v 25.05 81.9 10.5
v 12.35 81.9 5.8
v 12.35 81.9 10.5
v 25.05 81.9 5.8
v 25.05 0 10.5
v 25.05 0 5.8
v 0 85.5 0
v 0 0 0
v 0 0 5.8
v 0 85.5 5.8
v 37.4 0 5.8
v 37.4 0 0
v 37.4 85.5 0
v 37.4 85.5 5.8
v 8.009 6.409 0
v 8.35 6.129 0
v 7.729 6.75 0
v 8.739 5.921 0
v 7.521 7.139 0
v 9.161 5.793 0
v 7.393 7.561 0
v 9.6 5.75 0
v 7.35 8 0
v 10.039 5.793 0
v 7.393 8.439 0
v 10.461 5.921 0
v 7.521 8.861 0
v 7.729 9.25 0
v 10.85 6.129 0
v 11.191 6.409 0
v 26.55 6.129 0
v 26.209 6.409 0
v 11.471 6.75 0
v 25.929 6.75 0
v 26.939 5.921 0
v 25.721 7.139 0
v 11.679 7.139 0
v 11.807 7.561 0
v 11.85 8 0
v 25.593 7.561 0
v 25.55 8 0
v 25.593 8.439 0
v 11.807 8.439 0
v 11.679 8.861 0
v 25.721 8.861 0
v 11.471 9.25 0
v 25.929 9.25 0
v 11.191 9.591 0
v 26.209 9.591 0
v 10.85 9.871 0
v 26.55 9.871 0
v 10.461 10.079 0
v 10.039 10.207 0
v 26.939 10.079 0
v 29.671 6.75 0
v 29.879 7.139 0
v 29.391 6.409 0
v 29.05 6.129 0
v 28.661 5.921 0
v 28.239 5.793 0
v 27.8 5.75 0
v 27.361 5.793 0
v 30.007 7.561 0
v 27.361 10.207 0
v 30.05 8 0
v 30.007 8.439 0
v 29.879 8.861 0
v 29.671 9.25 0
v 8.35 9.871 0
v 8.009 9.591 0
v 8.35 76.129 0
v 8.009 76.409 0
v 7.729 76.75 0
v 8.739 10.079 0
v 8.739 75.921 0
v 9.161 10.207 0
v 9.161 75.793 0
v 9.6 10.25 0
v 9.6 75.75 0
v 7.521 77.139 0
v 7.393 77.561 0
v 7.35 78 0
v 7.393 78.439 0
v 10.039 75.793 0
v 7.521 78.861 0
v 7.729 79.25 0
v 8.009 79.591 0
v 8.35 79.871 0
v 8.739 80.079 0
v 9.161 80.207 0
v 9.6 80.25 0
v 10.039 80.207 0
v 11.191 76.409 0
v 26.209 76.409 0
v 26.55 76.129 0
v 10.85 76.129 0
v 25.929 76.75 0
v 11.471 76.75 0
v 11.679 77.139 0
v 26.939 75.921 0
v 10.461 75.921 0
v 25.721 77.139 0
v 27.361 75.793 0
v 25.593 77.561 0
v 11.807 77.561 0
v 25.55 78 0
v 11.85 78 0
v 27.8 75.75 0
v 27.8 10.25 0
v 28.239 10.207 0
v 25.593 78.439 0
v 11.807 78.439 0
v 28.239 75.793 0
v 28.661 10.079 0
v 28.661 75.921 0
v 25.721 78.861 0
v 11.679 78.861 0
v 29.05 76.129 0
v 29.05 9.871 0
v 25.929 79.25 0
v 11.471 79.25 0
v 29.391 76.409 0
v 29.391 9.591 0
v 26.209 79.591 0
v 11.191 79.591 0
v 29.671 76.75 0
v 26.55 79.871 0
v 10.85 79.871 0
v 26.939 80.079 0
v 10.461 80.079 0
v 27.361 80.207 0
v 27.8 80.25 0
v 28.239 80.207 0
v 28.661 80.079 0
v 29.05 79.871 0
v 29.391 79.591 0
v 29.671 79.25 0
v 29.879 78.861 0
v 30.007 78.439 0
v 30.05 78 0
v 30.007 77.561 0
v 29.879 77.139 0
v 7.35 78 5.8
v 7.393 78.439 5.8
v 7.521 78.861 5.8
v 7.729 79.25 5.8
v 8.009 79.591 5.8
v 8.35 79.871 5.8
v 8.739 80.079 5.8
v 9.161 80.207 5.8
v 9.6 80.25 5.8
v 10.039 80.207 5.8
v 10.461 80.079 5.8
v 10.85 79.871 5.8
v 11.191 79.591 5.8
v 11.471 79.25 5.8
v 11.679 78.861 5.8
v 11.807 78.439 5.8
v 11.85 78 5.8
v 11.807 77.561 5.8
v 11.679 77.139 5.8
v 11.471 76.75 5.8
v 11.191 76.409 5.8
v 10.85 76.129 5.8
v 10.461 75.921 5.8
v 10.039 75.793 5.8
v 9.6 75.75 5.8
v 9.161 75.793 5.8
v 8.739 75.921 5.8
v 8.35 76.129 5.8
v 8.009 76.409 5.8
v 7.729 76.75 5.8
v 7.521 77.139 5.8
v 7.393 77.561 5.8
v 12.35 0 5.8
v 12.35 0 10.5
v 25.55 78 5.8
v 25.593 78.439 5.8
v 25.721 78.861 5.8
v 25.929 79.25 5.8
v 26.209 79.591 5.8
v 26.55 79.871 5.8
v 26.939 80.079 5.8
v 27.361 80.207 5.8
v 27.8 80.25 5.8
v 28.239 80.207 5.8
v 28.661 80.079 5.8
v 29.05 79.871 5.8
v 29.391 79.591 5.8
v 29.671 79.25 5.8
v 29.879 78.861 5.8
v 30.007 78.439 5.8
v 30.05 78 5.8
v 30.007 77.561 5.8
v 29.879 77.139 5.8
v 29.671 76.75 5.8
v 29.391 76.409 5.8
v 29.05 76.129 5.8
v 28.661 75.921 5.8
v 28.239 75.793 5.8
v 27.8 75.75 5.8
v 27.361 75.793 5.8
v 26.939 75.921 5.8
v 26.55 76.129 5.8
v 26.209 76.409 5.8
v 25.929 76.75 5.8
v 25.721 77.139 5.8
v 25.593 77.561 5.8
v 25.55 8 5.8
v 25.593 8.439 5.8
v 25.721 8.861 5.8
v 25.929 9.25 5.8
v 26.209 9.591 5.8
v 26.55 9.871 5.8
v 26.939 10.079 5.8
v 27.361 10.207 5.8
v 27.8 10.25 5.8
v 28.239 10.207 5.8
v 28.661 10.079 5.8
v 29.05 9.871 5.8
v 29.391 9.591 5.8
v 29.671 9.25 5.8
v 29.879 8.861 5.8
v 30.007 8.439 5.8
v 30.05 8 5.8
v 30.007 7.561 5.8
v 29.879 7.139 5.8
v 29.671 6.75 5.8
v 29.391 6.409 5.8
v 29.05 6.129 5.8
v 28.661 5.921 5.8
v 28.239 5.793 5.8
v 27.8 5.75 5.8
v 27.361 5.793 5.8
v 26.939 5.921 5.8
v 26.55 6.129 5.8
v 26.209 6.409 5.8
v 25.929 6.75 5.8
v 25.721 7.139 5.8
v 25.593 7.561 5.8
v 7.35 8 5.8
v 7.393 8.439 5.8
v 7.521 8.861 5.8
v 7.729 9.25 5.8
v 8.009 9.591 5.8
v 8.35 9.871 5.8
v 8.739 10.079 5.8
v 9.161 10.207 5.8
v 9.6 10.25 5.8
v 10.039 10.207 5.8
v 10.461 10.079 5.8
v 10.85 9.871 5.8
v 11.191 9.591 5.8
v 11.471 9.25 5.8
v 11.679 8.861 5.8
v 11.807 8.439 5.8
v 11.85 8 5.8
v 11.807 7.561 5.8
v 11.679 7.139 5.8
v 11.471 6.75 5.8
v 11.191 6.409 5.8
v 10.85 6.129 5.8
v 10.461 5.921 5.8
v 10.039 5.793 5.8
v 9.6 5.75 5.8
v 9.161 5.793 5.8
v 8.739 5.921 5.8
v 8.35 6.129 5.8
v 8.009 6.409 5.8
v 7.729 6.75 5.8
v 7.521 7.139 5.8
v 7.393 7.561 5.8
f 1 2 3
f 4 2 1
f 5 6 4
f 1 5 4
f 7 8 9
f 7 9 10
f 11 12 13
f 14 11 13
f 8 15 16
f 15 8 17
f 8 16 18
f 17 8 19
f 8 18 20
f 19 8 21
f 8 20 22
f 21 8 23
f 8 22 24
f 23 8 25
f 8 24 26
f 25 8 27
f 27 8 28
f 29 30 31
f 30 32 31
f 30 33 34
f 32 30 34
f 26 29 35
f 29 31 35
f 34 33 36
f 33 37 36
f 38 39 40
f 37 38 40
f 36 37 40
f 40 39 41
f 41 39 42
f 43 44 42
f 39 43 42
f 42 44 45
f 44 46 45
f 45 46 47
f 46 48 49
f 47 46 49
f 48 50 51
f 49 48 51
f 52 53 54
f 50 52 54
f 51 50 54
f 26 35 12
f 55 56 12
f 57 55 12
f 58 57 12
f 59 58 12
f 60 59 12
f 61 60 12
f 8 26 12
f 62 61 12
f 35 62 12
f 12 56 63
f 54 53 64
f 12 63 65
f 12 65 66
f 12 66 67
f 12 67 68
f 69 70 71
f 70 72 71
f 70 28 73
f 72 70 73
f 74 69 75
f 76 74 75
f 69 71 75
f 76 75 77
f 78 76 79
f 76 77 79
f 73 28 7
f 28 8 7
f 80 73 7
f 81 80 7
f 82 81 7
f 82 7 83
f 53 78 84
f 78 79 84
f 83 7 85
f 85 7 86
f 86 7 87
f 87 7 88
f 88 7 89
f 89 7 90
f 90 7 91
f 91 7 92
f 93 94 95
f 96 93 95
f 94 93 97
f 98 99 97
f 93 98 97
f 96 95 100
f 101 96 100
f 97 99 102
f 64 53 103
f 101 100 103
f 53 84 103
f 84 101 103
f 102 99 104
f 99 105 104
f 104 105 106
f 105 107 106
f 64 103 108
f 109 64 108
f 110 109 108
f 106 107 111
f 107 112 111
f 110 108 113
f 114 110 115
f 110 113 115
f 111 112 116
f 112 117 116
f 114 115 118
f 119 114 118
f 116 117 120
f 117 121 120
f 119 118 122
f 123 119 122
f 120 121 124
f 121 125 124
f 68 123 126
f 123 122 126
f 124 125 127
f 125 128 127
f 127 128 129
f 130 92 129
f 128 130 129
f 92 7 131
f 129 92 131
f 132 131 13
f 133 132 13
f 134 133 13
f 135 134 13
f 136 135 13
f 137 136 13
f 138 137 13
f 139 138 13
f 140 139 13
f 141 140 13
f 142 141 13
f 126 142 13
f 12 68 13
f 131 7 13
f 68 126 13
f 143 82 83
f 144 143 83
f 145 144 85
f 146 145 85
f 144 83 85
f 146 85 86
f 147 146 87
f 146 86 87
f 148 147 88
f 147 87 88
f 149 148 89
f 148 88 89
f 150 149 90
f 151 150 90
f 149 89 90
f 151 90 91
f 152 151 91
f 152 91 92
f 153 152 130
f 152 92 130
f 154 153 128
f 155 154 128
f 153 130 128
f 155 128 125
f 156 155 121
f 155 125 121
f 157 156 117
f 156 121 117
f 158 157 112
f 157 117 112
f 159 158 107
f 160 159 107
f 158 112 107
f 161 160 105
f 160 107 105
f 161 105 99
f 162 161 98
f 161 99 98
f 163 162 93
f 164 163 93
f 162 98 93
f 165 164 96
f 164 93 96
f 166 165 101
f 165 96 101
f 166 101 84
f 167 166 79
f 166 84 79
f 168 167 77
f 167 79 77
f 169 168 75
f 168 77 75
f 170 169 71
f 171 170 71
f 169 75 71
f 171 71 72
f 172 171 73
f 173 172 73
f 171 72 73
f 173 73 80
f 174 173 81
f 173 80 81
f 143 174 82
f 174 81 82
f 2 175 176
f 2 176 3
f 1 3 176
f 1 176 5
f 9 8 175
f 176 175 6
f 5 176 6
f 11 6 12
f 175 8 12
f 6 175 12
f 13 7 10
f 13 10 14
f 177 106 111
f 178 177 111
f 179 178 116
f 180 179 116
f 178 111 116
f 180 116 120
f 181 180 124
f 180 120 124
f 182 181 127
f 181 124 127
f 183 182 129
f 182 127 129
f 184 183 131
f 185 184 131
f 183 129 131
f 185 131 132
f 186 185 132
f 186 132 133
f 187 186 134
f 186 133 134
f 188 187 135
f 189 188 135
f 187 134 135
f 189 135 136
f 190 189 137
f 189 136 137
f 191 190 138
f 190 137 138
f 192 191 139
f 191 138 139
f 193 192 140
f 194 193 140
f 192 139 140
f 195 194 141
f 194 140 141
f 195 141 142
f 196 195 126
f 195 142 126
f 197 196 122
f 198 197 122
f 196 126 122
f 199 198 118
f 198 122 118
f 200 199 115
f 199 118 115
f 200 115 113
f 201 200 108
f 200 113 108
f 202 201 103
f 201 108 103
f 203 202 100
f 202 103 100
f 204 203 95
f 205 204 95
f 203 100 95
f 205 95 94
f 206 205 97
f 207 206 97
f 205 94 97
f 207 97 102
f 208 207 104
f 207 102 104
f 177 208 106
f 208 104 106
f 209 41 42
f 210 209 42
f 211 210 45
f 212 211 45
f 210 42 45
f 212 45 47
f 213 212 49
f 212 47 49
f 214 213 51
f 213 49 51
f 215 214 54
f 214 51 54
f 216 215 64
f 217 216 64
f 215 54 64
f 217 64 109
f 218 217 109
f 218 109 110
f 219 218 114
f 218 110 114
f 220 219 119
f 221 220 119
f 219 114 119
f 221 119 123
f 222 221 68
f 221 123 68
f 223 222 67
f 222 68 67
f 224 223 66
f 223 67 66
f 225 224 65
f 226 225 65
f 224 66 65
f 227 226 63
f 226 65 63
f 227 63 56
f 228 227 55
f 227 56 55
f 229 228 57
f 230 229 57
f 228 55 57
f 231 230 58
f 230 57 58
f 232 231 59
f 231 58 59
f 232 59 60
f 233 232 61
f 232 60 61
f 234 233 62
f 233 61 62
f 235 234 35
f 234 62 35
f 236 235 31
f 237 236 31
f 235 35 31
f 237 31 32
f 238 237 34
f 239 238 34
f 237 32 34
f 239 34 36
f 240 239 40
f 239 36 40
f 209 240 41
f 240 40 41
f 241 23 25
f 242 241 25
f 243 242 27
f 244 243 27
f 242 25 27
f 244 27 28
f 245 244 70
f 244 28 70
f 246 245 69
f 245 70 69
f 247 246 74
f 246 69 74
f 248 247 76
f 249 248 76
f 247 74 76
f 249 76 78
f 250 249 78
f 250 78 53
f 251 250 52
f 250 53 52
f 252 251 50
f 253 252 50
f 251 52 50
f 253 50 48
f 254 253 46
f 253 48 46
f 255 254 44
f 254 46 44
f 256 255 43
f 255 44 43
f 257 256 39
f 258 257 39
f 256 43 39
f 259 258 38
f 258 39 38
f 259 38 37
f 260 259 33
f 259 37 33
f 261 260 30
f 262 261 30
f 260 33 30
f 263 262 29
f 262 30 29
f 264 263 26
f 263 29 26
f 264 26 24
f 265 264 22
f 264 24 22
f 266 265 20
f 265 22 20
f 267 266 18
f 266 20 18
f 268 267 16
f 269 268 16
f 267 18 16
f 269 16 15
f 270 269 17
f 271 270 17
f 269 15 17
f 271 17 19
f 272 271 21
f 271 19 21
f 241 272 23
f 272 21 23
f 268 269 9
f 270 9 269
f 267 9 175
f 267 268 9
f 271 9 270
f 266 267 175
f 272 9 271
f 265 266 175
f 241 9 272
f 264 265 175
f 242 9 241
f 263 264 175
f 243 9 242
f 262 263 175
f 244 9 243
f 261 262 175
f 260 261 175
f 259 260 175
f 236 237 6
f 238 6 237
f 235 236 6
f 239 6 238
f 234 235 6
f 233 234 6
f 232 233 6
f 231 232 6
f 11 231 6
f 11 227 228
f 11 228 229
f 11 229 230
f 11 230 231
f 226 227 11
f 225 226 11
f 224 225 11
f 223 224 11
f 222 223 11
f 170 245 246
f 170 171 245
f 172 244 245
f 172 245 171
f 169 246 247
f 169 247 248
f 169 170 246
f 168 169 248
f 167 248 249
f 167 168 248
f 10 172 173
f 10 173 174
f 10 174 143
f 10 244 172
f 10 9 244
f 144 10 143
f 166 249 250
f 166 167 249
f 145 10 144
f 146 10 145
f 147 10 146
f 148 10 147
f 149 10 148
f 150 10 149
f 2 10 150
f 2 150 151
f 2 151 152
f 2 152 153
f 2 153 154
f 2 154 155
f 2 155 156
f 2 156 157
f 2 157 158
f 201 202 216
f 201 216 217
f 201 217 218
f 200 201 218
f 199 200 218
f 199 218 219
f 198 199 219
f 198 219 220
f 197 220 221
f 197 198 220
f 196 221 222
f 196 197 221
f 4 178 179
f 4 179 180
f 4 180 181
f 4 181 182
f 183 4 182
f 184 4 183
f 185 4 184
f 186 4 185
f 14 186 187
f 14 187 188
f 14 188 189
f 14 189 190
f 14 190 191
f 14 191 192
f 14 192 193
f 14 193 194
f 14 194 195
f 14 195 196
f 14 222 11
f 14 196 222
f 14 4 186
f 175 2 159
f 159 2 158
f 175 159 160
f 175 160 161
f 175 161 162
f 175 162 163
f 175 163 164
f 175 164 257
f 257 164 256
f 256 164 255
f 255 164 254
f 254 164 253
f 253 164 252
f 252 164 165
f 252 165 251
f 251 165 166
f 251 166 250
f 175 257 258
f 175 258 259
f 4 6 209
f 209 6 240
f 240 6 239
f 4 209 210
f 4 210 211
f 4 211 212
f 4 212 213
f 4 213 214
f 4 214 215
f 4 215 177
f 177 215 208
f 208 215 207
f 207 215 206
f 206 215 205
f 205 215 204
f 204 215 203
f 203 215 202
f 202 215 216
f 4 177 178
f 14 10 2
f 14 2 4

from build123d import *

# Parameters (mm, degrees)
SKETCH2_W           = 37.4
SKETCH2_H           = 85.5
BOSS_EXTRUDE1_DEPTH = 5.8
SKETCH3_W           = 12.7
SKETCH3_H           = 81.9
BOSS_EXTRUDE2_DEPTH = 4.7
SKETCH4_R           = 2.25
CUT_EXTRUDE1_DEPTH  = 5.8


with BuildPart() as part:
    # Sketch2 → Boss-Extrude1 (new body)
    with BuildSketch(Plane.XY):
        with Locations((18.7, 42.75)):
            Rectangle(SKETCH2_W, SKETCH2_H)
    extrude(amount=BOSS_EXTRUDE1_DEPTH)

    # Sketch3 → Boss-Extrude2 (add)
    with BuildSketch(Plane.XY.offset(5.8)):
        with Locations((18.7, 40.95)):
            Rectangle(SKETCH3_W, SKETCH3_H)
    extrude(amount=BOSS_EXTRUDE2_DEPTH)

    # Sketch4 → Cut-Extrude1 (cut)
    with BuildSketch(Plane(origin=(0, 0, 0), x_dir=(-1, 0, 0), z_dir=(0, 0, -1))):
        with Locations((-27.8, 78)):
            Circle(SKETCH4_R)
        with Locations((-9.6, 78)):
            Circle(SKETCH4_R)
        with Locations((-9.6, 8)):
            Circle(SKETCH4_R)
        with Locations((-27.8, 8)):
            Circle(SKETCH4_R)
    extrude(amount=-CUT_EXTRUDE1_DEPTH, mode=Mode.SUBTRACT)


solid = part.part
